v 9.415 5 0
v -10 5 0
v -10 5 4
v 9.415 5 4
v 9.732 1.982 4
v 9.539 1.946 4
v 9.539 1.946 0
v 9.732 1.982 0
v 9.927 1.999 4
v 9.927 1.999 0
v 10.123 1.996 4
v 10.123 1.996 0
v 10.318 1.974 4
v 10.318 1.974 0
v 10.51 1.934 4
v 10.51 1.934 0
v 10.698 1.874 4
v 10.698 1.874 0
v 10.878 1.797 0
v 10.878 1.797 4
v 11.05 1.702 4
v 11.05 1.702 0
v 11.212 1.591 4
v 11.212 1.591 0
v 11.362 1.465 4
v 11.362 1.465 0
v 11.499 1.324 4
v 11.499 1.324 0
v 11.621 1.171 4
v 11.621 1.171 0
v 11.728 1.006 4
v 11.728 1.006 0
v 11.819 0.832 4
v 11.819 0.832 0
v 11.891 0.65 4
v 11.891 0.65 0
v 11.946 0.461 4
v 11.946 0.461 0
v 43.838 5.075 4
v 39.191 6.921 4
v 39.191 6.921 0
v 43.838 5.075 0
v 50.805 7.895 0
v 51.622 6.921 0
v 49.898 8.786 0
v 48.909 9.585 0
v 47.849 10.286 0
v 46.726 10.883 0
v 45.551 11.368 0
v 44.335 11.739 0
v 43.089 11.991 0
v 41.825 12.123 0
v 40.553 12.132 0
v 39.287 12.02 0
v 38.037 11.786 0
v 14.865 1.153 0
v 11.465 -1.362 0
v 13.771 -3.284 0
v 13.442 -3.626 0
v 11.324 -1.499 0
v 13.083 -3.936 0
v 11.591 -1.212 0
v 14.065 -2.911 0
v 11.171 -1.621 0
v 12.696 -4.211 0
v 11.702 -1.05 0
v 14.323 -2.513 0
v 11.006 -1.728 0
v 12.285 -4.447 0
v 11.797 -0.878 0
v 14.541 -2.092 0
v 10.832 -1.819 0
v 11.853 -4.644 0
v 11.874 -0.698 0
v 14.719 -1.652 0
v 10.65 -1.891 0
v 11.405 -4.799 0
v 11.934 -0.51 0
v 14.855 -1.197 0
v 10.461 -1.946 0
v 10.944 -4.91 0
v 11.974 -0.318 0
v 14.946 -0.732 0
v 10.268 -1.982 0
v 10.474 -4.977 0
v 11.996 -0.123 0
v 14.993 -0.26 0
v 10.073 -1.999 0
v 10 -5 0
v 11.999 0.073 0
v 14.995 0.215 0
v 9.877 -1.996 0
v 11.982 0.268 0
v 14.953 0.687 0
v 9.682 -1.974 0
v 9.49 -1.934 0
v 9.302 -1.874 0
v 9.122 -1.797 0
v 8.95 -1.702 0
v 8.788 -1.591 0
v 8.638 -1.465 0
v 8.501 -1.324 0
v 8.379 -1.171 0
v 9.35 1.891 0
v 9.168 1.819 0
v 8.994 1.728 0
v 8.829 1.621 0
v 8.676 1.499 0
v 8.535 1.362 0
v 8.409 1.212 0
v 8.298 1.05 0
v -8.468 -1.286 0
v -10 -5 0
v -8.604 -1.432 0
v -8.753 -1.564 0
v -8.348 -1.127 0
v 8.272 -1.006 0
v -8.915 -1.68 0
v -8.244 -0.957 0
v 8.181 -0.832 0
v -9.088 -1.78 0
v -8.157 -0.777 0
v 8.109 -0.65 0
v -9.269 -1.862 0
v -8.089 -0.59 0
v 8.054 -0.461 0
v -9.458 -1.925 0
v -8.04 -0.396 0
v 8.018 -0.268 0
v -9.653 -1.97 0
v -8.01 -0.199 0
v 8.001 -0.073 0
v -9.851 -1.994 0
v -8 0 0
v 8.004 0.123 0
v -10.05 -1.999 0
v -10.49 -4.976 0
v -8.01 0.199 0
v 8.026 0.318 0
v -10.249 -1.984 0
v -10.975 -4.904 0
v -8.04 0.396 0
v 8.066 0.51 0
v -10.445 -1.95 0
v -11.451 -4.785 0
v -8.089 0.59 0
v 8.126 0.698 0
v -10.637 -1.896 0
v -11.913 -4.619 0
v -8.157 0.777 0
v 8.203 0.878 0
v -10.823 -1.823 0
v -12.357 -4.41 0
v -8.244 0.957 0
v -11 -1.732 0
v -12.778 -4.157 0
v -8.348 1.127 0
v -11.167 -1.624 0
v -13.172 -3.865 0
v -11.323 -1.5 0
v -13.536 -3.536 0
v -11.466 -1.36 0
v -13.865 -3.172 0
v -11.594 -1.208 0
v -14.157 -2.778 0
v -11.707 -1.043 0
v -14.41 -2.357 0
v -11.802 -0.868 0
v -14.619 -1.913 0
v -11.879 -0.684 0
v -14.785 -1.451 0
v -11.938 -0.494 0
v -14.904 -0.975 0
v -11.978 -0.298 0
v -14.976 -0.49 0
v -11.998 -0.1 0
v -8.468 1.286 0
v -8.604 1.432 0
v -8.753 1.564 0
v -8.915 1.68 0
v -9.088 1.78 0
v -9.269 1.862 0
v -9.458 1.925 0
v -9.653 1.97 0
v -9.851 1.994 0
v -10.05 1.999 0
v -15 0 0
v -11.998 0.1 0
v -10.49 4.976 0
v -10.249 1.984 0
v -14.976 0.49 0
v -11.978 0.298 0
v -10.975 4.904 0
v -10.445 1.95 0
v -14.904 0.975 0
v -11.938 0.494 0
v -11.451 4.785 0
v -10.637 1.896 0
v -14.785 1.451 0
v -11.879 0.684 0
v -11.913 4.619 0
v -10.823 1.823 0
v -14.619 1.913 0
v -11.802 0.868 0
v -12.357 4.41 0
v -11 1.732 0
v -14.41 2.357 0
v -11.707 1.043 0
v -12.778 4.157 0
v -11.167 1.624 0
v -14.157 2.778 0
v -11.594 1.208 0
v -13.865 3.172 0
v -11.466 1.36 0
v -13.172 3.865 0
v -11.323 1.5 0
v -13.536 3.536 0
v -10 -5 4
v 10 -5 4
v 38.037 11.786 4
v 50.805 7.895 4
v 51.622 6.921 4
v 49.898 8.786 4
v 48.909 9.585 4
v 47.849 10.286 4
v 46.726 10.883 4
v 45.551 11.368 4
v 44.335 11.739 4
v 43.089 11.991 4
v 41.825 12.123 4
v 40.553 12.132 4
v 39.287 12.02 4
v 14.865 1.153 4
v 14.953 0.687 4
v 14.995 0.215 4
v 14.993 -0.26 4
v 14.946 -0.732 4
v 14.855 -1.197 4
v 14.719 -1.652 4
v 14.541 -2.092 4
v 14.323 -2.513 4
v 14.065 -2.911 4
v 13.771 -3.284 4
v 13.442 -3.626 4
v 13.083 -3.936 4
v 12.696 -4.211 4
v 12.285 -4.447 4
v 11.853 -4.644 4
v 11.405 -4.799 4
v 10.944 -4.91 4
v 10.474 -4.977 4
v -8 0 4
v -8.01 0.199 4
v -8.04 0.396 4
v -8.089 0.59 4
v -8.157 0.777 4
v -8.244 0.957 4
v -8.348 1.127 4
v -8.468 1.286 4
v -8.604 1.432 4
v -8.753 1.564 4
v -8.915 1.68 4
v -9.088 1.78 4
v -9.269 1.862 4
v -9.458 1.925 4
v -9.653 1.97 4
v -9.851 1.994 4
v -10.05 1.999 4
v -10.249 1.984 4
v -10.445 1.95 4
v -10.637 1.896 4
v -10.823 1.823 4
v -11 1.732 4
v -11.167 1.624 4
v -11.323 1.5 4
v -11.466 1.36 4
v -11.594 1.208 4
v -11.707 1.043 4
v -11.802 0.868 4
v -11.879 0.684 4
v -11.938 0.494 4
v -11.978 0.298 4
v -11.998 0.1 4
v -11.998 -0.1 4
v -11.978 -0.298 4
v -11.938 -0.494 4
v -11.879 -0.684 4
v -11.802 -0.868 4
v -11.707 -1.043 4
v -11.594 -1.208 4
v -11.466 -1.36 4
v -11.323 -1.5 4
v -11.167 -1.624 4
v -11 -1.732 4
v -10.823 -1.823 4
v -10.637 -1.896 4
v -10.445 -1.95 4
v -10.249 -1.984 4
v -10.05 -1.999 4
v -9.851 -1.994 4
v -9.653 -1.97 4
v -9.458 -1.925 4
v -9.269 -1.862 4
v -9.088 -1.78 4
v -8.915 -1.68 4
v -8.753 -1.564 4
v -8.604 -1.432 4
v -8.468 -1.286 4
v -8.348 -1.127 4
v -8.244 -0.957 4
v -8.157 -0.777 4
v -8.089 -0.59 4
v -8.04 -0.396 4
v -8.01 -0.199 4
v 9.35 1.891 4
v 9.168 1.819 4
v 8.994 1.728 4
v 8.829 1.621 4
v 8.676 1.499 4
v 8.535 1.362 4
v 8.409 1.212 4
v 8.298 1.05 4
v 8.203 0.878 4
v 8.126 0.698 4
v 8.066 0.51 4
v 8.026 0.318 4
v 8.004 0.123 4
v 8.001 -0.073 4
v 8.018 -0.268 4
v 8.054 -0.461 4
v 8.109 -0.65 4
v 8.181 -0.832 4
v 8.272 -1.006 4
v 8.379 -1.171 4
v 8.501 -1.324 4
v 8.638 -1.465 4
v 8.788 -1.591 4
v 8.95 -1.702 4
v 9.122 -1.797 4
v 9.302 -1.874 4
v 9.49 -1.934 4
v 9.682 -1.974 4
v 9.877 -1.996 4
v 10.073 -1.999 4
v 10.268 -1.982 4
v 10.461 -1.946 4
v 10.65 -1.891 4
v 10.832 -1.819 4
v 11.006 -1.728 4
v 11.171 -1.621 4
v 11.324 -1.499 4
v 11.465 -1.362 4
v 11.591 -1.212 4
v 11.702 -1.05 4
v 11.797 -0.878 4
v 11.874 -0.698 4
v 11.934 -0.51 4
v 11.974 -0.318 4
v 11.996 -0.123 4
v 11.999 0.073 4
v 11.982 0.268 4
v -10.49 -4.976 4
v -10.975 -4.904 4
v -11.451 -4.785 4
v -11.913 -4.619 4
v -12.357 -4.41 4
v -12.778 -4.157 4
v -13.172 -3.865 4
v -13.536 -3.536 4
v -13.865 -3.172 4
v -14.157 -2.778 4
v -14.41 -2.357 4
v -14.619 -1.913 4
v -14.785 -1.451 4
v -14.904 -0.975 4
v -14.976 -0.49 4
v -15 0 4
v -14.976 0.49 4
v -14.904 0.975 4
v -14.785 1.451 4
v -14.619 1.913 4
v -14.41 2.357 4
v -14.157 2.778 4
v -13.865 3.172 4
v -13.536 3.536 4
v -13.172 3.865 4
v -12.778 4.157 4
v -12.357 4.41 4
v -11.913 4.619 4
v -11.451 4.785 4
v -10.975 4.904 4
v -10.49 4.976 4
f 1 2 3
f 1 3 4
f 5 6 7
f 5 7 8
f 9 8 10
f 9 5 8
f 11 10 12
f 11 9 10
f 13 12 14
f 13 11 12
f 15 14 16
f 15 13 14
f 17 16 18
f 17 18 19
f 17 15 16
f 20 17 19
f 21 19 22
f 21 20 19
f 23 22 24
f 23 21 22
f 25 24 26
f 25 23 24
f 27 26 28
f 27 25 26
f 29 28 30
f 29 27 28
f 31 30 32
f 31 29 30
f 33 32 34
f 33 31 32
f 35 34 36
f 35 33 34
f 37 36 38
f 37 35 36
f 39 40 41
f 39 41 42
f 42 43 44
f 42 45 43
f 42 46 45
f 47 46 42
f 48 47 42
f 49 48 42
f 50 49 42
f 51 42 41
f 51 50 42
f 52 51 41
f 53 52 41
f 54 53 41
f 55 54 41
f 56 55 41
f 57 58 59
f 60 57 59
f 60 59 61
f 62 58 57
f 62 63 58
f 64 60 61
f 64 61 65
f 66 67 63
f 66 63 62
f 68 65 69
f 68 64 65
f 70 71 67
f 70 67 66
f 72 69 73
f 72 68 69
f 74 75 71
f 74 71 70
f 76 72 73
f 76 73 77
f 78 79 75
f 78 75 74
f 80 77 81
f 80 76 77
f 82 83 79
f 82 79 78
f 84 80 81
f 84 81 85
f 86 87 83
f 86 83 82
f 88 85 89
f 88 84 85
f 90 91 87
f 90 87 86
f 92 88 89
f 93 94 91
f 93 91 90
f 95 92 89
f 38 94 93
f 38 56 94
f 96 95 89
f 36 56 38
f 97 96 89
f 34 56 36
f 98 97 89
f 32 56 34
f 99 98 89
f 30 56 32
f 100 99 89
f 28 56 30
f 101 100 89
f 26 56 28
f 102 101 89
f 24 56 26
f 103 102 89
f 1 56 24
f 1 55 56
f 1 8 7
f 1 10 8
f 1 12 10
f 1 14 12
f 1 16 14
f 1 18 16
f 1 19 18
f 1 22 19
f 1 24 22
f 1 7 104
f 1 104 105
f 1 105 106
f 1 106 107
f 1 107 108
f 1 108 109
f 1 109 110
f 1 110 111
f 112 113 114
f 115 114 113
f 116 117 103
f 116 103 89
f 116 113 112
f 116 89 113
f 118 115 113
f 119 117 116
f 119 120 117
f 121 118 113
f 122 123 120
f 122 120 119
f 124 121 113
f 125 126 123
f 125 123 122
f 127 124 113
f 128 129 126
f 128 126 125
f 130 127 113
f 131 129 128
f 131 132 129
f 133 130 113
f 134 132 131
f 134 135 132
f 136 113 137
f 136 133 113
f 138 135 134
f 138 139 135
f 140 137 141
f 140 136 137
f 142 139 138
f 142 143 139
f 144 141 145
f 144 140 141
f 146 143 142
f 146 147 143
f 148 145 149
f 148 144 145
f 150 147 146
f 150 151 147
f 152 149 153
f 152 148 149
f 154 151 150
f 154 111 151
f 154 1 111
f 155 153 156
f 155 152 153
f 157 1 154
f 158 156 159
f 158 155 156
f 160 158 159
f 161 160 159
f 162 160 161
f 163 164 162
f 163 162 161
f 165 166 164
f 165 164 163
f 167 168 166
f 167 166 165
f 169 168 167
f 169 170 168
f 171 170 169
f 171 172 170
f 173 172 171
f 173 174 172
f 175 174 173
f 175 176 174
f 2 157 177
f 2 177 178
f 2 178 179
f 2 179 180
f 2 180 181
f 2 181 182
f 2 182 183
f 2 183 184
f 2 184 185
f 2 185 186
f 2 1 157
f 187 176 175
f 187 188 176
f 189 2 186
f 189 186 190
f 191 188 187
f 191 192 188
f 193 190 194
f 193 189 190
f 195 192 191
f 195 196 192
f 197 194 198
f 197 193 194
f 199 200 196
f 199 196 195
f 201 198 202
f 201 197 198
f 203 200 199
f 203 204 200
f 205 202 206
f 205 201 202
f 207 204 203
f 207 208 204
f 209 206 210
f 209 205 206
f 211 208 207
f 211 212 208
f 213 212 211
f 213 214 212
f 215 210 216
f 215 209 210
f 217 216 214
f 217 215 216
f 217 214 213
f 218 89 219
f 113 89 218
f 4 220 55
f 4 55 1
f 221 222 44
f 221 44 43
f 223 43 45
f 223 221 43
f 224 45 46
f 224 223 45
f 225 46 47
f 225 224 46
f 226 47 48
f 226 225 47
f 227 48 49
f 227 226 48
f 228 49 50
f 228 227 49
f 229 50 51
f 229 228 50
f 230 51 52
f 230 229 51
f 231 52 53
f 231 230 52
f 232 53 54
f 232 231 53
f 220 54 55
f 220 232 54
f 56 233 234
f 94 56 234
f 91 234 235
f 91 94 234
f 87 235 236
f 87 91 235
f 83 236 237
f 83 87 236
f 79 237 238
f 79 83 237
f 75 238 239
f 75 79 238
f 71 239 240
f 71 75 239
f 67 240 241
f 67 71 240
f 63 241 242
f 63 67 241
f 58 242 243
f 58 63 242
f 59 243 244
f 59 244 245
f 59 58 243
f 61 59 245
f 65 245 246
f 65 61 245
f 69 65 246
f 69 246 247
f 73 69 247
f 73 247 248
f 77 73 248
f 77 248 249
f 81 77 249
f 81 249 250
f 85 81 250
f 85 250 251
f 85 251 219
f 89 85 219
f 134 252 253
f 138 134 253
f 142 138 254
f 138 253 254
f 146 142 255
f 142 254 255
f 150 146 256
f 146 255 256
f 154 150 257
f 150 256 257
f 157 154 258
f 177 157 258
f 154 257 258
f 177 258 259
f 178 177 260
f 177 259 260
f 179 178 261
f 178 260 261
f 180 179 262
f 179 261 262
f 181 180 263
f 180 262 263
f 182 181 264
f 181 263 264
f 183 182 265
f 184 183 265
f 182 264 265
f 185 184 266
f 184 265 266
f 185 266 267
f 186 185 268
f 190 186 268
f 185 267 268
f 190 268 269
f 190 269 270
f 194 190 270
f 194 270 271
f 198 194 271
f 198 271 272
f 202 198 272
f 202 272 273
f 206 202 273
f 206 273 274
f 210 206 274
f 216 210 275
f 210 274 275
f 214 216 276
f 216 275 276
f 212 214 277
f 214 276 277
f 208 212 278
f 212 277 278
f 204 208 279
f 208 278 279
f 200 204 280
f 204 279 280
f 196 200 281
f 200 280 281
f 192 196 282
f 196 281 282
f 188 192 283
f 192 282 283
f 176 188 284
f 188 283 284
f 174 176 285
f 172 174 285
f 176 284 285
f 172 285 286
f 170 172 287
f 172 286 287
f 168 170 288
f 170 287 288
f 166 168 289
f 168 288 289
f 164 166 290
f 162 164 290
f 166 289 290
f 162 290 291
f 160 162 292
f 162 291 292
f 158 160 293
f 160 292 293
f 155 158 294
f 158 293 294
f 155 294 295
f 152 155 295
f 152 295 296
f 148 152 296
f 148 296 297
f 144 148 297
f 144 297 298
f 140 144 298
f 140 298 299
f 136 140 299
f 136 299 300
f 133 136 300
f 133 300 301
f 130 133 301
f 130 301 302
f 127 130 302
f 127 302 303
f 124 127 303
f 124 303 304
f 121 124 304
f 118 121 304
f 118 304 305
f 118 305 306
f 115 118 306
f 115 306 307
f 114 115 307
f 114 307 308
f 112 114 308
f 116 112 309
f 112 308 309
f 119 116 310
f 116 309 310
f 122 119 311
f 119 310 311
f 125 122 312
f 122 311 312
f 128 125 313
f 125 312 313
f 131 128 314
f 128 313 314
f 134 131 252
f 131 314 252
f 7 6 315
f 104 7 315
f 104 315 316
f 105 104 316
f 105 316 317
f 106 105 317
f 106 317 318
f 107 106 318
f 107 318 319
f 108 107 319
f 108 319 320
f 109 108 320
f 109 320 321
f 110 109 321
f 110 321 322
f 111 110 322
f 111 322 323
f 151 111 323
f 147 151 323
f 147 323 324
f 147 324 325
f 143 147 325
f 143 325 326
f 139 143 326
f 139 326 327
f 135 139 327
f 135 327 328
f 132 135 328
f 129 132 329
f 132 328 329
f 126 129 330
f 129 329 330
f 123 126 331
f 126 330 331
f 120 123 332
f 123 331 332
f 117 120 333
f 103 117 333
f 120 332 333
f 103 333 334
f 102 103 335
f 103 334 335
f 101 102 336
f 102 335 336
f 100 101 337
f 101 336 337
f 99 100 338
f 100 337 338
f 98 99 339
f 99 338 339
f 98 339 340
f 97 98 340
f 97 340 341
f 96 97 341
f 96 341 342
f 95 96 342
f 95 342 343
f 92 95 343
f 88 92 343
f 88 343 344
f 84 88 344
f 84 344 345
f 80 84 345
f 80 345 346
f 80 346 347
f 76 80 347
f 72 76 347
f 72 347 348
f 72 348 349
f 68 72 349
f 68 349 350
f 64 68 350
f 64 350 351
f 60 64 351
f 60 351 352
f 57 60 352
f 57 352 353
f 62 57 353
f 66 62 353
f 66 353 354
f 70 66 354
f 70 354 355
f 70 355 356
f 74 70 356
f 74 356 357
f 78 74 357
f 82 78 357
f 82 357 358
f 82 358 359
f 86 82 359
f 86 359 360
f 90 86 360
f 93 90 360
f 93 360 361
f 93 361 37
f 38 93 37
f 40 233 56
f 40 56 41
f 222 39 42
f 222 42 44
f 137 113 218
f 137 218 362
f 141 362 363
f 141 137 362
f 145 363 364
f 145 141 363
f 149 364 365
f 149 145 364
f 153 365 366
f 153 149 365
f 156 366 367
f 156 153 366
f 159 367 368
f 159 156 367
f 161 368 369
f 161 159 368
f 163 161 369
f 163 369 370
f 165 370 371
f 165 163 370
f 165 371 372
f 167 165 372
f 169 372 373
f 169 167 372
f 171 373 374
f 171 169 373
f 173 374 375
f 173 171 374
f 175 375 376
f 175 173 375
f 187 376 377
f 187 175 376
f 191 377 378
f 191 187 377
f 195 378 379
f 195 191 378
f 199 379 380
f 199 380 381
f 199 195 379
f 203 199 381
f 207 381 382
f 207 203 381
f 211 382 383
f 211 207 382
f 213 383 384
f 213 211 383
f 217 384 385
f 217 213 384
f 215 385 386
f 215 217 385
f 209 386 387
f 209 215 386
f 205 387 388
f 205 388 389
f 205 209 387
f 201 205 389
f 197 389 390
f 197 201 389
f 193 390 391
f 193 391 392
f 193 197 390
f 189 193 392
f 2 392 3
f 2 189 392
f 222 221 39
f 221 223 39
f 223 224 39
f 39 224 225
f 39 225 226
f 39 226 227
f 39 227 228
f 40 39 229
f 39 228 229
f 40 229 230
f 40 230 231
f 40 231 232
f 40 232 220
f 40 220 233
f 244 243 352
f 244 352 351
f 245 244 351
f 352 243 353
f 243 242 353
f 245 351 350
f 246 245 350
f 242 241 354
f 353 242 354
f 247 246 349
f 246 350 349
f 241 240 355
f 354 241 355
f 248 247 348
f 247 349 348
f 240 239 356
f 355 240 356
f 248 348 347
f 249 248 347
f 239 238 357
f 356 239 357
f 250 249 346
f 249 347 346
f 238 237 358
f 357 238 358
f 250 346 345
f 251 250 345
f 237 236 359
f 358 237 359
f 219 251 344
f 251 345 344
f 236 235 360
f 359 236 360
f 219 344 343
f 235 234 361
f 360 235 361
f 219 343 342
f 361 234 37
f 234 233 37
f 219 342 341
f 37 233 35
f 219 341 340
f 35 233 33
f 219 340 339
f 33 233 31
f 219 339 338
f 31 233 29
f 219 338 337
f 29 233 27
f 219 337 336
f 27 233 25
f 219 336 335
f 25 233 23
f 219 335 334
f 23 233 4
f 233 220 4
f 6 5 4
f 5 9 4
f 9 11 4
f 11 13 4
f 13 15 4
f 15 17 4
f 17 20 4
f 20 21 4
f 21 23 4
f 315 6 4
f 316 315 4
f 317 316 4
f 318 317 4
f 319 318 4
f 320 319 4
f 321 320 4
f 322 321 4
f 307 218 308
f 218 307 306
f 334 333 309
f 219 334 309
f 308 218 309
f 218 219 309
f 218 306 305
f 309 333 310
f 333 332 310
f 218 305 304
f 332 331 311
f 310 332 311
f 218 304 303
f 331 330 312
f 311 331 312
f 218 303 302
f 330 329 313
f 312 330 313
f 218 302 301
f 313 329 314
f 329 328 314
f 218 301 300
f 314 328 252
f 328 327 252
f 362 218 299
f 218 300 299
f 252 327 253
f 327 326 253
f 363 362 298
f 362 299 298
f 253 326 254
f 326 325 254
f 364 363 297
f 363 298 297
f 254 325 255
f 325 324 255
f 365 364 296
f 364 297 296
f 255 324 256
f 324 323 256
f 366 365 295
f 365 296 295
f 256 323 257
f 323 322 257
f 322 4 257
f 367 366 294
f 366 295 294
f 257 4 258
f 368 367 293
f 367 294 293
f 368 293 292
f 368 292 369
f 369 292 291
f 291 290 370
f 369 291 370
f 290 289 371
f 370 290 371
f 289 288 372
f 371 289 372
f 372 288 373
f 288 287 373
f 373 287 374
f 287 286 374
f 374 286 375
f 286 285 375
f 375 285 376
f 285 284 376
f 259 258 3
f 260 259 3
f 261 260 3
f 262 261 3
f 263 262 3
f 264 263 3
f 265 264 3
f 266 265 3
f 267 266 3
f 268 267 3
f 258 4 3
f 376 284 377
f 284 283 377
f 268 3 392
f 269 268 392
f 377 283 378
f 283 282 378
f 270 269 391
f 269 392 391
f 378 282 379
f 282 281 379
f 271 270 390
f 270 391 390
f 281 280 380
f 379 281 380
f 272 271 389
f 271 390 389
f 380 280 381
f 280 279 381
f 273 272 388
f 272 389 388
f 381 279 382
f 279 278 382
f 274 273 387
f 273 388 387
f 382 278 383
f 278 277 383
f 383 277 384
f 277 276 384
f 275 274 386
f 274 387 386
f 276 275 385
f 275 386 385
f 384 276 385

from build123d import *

# Parameters (mm, degrees)
EXTRUDE_1_DEPTH     = 4
SKETCH_2_R          = 2
CUT_EXTRUDE_1_DEPTH = 4
EXTRUDE_3_DEPTH     = 4


with BuildPart() as part:
    # 草图1 → 凸台-拉伸1 (new body)
    with BuildSketch(Plane.XY):
        with BuildLine():
            Line((-10, 5), (10, 5))
            ThreePointArc((10, 5), (15, 0), (10, -5))
            Line((10, -5), (-10, -5))
            ThreePointArc((-10, -5), (-15, 0), (-10, 5))
        make_face()
    extrude(amount=EXTRUDE_1_DEPTH)

    # 草图2 → 切除-拉伸1 (cut)
    with BuildSketch(Plane.XY.offset(4)):
        with Locations((-10, 0)):
            Circle(SKETCH_2_R)
        with Locations((10, 0)):
            Circle(SKETCH_2_R)
    extrude(amount=-CUT_EXTRUDE_1_DEPTH, mode=Mode.SUBTRACT)

    # 草图3 → 凸台-拉伸3 (add)
    with BuildSketch(Plane.XY.offset(4)):
        with BuildLine():
            Line((11.946050783, 0.461396089), (39.19076174, 6.920941341))
            Line((39.19076174, 6.920941341), (43.837655244, 5.075303033))
            Line((43.837655244, 5.075303033), (51.621858375, 6.920887391))
            ThreePointArc((51.621858375, 6.920887391), (45.551115726, 11.368196193), (38.037271516, 11.786068297))
            Line((38.037271516, 11.786068297), (8.846509777, 4.865126957))
            Line((8.846509777, 4.865126957), (9.538603911, 1.946050783))
            ThreePointArc((9.538603911, 1.946050783), (11.049809401, 1.702322009), (11.946050783, 0.461396089))
        make_face()
    extrude(amount=-EXTRUDE_3_DEPTH)


solid = part.part
